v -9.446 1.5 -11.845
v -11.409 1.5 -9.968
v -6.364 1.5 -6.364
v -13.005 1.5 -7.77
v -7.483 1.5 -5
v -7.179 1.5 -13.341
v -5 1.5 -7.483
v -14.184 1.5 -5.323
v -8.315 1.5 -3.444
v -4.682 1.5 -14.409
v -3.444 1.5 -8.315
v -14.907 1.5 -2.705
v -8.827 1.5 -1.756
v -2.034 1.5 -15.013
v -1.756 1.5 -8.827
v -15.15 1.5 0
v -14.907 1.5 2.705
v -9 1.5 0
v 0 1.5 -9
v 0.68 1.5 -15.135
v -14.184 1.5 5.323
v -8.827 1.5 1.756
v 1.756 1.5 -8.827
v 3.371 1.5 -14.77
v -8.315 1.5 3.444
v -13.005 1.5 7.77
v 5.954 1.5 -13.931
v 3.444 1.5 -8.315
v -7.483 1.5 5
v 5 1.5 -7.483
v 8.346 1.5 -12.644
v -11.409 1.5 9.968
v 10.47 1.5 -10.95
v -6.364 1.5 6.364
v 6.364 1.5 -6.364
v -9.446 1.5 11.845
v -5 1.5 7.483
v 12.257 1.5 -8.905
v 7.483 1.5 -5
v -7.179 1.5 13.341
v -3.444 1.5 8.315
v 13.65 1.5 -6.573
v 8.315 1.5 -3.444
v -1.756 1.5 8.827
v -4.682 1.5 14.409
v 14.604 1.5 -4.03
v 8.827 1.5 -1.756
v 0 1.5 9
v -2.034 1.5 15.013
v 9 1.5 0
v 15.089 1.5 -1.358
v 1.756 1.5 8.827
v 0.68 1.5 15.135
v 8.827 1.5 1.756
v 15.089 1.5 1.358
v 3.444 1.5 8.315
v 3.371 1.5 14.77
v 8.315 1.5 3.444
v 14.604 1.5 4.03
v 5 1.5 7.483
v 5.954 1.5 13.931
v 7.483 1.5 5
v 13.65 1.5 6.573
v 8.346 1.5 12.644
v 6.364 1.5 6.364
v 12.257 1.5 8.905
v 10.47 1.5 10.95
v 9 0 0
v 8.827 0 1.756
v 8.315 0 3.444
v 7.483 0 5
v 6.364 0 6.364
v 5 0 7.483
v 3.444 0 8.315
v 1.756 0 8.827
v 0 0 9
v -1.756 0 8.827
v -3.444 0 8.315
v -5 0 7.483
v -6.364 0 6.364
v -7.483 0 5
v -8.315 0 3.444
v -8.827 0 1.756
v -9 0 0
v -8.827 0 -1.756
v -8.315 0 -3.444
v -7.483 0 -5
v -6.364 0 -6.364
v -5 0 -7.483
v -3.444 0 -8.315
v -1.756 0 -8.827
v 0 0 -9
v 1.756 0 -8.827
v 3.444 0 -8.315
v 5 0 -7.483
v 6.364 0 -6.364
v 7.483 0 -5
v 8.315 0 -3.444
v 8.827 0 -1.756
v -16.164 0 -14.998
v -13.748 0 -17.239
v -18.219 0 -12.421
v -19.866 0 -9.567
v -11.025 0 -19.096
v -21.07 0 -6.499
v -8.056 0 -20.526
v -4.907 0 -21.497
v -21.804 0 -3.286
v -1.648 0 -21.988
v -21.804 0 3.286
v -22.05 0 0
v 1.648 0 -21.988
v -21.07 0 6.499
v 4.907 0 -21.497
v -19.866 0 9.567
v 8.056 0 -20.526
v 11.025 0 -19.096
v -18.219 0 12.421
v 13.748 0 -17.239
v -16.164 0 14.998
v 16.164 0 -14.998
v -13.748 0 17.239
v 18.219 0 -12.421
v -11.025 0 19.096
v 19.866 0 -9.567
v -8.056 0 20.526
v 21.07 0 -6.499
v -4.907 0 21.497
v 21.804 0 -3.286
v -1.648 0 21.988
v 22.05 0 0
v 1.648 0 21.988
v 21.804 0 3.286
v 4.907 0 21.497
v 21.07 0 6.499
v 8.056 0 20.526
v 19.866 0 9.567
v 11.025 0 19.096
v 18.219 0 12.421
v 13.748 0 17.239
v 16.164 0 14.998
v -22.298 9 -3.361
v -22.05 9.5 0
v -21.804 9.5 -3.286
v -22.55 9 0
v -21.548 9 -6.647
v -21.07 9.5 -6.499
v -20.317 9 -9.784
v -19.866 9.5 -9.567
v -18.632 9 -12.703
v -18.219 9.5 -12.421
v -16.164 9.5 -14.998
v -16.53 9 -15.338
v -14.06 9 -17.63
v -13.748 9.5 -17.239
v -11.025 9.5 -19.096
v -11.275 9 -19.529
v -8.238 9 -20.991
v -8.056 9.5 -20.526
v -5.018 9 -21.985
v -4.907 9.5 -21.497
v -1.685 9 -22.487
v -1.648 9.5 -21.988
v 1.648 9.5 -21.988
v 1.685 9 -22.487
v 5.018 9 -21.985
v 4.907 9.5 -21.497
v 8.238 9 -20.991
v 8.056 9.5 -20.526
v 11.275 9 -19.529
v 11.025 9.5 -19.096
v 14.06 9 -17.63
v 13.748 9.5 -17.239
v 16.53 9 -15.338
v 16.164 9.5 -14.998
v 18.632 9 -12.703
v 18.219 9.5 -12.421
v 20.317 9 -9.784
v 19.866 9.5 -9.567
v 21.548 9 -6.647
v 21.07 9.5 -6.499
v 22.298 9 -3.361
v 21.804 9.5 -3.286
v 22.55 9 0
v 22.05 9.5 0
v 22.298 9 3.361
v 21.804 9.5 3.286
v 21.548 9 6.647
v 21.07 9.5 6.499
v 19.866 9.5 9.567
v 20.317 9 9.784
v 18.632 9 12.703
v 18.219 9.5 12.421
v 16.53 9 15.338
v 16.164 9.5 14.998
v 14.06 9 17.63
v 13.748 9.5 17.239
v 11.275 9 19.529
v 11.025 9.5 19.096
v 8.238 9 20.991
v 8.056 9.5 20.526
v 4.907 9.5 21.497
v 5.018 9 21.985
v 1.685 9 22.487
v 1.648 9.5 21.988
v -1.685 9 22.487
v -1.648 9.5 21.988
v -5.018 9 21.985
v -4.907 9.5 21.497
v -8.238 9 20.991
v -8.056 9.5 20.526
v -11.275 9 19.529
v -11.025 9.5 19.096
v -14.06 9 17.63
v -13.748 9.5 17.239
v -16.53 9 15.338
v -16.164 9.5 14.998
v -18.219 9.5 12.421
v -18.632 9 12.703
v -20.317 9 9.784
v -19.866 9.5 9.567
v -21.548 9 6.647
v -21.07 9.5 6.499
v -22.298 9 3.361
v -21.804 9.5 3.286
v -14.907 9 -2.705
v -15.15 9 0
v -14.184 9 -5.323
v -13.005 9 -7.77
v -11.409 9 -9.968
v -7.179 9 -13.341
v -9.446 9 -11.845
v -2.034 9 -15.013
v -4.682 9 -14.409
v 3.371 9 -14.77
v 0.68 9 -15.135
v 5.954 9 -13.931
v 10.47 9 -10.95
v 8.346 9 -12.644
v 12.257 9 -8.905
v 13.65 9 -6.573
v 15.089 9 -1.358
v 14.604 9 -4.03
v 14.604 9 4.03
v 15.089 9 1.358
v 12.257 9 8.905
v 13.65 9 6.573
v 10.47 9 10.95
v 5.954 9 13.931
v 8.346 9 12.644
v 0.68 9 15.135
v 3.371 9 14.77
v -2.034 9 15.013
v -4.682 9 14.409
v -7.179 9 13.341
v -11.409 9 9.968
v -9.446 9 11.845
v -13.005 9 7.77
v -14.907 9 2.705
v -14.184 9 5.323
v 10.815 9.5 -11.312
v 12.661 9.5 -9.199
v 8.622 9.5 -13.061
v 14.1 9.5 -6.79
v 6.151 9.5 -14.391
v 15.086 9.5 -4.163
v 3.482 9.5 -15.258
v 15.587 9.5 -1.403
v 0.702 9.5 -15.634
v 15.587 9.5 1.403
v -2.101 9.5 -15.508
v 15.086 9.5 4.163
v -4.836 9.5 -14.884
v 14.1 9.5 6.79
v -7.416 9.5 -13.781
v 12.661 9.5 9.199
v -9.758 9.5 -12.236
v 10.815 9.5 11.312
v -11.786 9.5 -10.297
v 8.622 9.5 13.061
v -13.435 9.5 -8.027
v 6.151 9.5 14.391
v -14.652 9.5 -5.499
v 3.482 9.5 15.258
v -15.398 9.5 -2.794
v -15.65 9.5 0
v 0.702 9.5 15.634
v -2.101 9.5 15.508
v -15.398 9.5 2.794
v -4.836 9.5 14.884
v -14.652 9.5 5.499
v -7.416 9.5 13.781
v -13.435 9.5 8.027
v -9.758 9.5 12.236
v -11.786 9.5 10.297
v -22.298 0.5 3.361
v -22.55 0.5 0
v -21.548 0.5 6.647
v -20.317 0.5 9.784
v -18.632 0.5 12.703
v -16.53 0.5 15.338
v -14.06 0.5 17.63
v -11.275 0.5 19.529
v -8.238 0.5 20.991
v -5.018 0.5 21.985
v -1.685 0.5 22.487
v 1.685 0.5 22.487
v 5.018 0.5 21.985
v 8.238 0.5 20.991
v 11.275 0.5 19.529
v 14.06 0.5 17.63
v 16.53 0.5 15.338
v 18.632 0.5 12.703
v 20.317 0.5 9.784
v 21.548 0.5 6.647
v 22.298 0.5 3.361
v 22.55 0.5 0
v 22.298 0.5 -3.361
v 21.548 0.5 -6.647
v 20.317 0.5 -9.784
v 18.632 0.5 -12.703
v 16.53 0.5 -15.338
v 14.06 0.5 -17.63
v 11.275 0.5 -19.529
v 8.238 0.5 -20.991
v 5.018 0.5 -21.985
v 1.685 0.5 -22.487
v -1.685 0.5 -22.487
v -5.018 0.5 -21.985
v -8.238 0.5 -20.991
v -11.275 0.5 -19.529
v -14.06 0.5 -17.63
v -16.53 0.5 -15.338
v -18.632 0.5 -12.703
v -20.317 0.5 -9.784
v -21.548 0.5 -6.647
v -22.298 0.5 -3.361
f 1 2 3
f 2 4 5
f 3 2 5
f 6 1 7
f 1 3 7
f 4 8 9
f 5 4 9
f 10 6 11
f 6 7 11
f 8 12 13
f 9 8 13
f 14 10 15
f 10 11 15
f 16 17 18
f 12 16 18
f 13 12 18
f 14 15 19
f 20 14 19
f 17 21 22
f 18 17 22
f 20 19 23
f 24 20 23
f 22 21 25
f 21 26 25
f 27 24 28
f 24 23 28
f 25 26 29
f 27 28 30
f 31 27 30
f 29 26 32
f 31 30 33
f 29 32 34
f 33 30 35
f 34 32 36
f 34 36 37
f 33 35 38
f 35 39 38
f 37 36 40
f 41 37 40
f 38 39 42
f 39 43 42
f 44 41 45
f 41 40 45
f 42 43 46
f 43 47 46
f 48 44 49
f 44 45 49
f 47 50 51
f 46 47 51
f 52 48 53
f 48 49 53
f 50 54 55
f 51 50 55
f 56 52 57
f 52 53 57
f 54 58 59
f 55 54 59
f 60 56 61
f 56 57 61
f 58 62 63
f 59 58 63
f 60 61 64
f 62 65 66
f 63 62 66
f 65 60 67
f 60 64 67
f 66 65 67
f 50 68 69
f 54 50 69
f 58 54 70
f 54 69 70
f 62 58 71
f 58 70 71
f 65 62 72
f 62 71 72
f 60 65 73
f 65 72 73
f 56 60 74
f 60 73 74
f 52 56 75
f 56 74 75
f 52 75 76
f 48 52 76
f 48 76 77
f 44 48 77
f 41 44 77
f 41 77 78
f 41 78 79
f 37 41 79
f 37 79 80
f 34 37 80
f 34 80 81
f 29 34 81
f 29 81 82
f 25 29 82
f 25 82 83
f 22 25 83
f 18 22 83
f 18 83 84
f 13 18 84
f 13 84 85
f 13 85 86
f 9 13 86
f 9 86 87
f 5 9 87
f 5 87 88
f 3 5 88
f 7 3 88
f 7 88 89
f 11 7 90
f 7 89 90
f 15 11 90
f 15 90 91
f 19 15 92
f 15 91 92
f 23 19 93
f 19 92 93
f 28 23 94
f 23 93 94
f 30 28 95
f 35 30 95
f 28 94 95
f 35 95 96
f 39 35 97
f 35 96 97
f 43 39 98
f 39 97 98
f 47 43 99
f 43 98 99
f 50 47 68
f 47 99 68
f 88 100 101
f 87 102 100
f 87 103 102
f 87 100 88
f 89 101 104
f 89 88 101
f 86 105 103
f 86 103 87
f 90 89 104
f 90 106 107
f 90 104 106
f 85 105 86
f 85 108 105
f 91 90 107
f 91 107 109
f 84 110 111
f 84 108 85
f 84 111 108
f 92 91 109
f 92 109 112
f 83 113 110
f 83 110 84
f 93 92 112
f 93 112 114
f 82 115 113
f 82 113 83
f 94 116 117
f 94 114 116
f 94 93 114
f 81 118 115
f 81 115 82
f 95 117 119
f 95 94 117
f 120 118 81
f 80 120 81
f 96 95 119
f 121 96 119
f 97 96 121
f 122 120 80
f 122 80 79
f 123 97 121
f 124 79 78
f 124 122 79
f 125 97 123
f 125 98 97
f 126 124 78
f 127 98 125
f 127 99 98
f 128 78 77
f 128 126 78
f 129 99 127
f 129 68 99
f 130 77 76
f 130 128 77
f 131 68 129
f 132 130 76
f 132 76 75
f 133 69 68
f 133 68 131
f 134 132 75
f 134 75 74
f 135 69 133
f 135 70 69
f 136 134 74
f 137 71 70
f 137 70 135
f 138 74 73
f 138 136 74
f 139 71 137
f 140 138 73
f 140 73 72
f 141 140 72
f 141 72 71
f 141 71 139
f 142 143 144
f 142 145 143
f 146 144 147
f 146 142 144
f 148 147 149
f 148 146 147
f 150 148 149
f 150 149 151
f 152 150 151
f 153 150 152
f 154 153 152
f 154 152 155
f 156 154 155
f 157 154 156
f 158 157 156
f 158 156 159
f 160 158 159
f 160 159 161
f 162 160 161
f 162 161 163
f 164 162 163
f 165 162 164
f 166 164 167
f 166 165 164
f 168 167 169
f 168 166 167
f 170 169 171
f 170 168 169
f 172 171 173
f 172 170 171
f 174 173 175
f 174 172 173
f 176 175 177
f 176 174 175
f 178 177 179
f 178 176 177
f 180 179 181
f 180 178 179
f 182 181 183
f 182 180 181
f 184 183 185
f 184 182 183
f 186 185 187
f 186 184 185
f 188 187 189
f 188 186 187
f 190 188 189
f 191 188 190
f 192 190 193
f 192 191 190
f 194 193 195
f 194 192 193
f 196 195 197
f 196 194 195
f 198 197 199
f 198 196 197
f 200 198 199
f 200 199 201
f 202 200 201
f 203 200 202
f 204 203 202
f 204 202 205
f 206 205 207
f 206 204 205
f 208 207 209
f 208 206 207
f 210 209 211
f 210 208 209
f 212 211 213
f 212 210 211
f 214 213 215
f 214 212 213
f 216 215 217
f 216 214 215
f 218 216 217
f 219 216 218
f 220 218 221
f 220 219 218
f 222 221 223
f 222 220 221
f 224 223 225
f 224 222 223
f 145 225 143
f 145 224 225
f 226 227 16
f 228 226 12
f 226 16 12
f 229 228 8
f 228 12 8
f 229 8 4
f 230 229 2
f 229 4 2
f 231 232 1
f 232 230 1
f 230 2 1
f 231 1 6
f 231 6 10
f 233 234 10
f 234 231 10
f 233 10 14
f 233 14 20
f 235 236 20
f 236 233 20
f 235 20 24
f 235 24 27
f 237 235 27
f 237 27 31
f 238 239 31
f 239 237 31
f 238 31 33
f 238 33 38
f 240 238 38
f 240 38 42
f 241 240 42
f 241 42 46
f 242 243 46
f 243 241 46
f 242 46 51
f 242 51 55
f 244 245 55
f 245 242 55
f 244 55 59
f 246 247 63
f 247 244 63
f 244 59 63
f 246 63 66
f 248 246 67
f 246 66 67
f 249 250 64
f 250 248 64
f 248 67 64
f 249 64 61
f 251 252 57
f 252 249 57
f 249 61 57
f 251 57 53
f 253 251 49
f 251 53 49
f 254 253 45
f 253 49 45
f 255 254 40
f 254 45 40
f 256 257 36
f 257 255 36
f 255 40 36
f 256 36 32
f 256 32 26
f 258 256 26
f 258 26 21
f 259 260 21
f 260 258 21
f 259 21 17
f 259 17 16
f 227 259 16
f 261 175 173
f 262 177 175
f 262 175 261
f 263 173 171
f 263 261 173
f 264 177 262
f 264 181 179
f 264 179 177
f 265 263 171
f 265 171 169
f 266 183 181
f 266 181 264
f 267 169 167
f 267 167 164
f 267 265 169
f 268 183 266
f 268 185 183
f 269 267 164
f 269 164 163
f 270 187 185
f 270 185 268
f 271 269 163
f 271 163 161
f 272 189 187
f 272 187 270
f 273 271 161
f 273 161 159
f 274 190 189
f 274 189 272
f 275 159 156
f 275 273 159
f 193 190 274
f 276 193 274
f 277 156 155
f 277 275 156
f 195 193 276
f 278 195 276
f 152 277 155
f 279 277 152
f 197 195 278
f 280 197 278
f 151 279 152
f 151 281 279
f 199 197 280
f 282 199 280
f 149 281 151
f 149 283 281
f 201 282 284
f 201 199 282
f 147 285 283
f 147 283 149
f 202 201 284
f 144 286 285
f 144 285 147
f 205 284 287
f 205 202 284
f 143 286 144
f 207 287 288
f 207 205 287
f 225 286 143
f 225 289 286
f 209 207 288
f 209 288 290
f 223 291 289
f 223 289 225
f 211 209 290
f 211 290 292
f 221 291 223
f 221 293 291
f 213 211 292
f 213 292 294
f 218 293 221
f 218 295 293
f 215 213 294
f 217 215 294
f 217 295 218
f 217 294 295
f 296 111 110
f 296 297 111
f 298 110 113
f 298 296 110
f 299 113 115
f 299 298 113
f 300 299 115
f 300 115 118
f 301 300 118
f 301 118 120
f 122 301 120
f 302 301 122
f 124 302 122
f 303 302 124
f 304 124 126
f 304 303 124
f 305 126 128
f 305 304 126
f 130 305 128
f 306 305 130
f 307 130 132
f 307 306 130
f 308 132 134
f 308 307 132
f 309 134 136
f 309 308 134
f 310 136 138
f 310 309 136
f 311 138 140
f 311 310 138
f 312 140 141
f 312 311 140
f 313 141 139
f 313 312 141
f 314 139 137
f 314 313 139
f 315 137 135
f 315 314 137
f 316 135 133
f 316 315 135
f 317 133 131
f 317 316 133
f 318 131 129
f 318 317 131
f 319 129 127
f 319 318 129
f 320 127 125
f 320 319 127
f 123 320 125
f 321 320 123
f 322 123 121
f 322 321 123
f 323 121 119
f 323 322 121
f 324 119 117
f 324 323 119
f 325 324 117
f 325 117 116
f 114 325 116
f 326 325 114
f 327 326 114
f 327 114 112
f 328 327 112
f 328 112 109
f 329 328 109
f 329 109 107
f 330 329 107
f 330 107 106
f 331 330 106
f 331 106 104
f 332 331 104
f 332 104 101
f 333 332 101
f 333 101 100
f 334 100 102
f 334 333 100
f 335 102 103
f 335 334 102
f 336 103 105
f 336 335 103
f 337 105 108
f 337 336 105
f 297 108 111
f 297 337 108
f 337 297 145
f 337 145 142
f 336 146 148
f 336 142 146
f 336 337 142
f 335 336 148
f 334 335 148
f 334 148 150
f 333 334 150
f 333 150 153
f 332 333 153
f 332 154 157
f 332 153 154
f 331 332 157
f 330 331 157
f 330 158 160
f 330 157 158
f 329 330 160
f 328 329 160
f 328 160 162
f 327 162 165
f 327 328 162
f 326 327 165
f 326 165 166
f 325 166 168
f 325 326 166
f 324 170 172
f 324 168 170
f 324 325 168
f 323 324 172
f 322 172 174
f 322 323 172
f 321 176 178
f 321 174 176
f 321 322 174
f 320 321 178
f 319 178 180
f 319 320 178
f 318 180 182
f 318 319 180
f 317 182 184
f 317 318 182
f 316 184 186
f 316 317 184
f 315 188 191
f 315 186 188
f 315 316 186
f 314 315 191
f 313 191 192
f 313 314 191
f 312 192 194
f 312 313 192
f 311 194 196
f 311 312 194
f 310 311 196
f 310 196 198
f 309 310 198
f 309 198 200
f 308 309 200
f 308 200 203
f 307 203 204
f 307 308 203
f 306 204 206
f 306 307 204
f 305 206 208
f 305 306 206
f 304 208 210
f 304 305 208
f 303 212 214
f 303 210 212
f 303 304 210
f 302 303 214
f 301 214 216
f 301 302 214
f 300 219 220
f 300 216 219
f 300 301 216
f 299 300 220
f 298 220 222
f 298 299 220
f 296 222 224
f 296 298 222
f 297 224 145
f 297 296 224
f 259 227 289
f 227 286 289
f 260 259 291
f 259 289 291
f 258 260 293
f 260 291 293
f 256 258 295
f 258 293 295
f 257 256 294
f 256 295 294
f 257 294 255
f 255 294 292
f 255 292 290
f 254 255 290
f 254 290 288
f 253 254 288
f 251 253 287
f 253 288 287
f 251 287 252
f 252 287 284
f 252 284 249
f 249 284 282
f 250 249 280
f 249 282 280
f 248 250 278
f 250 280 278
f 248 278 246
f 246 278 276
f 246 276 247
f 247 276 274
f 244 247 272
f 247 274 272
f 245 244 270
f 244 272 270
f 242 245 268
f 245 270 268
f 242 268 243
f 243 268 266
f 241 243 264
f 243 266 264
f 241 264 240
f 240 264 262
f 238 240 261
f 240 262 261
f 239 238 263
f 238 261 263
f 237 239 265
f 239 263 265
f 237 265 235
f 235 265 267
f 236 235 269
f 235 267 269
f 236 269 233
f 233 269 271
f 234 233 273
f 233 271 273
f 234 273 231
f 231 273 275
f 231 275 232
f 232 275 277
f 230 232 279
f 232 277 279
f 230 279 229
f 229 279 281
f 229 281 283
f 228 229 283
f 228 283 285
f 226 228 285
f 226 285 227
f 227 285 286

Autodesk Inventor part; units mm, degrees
ref_plane "YZ Plane" through (0, 0, 0) normal (1, 0, 0) x (0, 1, 0)
ref_plane "XZ Plane" through (0, 0, 0) normal (0, 1, 0) x (-1, 0, 0)
ref_plane "XY Plane" through (0, 0, 0) normal (0, 0, 1) x (1, 0, 0)
sketch "Sketch1" plane through (0, 0, 0) normal (0, 1, 0) x (-1, 0, 0)
  point P0 (0, 0)
sketch "Sketch2" plane through (0, 0, 0) normal (0, 1, 0) x (-1, 0, 0)
  circle A0 centre (0, 0) radius 15.15
  circle A1 centre (0, 0) radius 17.65
  circle A2 centre (0, 0) radius 22.55
  circle A3 centre (0, 0) radius 20.05
  dimension "d0" = 30.3
  dimension "d1" = 2.5
  dimension "d2" = 45.1
  dimension "d3" = 2.5
extrude "Extrusion1" add sketch "Sketch2" along normal blind 9.5 contours A1 | A2 | A3
sketch "Sketch3" plane through (0, 0, 0) normal (0, -1, 0) x (1, 0, 0)
  circle A0 centre (0, 0) radius 15.15 projected
  circle A1 centre (0, 0) radius 9
  dimension "d8" = 18
extrude "Extrusion2" add sketch "Sketch3" against normal blind 1.5
chamfer "Chamfer1" distance 0.5 angle 45 3 edges at (22.55, 0, 0) (15.15, 9.5, 0) (22.55, 9.5, 0)
properties part number "Bearing Spacer"
